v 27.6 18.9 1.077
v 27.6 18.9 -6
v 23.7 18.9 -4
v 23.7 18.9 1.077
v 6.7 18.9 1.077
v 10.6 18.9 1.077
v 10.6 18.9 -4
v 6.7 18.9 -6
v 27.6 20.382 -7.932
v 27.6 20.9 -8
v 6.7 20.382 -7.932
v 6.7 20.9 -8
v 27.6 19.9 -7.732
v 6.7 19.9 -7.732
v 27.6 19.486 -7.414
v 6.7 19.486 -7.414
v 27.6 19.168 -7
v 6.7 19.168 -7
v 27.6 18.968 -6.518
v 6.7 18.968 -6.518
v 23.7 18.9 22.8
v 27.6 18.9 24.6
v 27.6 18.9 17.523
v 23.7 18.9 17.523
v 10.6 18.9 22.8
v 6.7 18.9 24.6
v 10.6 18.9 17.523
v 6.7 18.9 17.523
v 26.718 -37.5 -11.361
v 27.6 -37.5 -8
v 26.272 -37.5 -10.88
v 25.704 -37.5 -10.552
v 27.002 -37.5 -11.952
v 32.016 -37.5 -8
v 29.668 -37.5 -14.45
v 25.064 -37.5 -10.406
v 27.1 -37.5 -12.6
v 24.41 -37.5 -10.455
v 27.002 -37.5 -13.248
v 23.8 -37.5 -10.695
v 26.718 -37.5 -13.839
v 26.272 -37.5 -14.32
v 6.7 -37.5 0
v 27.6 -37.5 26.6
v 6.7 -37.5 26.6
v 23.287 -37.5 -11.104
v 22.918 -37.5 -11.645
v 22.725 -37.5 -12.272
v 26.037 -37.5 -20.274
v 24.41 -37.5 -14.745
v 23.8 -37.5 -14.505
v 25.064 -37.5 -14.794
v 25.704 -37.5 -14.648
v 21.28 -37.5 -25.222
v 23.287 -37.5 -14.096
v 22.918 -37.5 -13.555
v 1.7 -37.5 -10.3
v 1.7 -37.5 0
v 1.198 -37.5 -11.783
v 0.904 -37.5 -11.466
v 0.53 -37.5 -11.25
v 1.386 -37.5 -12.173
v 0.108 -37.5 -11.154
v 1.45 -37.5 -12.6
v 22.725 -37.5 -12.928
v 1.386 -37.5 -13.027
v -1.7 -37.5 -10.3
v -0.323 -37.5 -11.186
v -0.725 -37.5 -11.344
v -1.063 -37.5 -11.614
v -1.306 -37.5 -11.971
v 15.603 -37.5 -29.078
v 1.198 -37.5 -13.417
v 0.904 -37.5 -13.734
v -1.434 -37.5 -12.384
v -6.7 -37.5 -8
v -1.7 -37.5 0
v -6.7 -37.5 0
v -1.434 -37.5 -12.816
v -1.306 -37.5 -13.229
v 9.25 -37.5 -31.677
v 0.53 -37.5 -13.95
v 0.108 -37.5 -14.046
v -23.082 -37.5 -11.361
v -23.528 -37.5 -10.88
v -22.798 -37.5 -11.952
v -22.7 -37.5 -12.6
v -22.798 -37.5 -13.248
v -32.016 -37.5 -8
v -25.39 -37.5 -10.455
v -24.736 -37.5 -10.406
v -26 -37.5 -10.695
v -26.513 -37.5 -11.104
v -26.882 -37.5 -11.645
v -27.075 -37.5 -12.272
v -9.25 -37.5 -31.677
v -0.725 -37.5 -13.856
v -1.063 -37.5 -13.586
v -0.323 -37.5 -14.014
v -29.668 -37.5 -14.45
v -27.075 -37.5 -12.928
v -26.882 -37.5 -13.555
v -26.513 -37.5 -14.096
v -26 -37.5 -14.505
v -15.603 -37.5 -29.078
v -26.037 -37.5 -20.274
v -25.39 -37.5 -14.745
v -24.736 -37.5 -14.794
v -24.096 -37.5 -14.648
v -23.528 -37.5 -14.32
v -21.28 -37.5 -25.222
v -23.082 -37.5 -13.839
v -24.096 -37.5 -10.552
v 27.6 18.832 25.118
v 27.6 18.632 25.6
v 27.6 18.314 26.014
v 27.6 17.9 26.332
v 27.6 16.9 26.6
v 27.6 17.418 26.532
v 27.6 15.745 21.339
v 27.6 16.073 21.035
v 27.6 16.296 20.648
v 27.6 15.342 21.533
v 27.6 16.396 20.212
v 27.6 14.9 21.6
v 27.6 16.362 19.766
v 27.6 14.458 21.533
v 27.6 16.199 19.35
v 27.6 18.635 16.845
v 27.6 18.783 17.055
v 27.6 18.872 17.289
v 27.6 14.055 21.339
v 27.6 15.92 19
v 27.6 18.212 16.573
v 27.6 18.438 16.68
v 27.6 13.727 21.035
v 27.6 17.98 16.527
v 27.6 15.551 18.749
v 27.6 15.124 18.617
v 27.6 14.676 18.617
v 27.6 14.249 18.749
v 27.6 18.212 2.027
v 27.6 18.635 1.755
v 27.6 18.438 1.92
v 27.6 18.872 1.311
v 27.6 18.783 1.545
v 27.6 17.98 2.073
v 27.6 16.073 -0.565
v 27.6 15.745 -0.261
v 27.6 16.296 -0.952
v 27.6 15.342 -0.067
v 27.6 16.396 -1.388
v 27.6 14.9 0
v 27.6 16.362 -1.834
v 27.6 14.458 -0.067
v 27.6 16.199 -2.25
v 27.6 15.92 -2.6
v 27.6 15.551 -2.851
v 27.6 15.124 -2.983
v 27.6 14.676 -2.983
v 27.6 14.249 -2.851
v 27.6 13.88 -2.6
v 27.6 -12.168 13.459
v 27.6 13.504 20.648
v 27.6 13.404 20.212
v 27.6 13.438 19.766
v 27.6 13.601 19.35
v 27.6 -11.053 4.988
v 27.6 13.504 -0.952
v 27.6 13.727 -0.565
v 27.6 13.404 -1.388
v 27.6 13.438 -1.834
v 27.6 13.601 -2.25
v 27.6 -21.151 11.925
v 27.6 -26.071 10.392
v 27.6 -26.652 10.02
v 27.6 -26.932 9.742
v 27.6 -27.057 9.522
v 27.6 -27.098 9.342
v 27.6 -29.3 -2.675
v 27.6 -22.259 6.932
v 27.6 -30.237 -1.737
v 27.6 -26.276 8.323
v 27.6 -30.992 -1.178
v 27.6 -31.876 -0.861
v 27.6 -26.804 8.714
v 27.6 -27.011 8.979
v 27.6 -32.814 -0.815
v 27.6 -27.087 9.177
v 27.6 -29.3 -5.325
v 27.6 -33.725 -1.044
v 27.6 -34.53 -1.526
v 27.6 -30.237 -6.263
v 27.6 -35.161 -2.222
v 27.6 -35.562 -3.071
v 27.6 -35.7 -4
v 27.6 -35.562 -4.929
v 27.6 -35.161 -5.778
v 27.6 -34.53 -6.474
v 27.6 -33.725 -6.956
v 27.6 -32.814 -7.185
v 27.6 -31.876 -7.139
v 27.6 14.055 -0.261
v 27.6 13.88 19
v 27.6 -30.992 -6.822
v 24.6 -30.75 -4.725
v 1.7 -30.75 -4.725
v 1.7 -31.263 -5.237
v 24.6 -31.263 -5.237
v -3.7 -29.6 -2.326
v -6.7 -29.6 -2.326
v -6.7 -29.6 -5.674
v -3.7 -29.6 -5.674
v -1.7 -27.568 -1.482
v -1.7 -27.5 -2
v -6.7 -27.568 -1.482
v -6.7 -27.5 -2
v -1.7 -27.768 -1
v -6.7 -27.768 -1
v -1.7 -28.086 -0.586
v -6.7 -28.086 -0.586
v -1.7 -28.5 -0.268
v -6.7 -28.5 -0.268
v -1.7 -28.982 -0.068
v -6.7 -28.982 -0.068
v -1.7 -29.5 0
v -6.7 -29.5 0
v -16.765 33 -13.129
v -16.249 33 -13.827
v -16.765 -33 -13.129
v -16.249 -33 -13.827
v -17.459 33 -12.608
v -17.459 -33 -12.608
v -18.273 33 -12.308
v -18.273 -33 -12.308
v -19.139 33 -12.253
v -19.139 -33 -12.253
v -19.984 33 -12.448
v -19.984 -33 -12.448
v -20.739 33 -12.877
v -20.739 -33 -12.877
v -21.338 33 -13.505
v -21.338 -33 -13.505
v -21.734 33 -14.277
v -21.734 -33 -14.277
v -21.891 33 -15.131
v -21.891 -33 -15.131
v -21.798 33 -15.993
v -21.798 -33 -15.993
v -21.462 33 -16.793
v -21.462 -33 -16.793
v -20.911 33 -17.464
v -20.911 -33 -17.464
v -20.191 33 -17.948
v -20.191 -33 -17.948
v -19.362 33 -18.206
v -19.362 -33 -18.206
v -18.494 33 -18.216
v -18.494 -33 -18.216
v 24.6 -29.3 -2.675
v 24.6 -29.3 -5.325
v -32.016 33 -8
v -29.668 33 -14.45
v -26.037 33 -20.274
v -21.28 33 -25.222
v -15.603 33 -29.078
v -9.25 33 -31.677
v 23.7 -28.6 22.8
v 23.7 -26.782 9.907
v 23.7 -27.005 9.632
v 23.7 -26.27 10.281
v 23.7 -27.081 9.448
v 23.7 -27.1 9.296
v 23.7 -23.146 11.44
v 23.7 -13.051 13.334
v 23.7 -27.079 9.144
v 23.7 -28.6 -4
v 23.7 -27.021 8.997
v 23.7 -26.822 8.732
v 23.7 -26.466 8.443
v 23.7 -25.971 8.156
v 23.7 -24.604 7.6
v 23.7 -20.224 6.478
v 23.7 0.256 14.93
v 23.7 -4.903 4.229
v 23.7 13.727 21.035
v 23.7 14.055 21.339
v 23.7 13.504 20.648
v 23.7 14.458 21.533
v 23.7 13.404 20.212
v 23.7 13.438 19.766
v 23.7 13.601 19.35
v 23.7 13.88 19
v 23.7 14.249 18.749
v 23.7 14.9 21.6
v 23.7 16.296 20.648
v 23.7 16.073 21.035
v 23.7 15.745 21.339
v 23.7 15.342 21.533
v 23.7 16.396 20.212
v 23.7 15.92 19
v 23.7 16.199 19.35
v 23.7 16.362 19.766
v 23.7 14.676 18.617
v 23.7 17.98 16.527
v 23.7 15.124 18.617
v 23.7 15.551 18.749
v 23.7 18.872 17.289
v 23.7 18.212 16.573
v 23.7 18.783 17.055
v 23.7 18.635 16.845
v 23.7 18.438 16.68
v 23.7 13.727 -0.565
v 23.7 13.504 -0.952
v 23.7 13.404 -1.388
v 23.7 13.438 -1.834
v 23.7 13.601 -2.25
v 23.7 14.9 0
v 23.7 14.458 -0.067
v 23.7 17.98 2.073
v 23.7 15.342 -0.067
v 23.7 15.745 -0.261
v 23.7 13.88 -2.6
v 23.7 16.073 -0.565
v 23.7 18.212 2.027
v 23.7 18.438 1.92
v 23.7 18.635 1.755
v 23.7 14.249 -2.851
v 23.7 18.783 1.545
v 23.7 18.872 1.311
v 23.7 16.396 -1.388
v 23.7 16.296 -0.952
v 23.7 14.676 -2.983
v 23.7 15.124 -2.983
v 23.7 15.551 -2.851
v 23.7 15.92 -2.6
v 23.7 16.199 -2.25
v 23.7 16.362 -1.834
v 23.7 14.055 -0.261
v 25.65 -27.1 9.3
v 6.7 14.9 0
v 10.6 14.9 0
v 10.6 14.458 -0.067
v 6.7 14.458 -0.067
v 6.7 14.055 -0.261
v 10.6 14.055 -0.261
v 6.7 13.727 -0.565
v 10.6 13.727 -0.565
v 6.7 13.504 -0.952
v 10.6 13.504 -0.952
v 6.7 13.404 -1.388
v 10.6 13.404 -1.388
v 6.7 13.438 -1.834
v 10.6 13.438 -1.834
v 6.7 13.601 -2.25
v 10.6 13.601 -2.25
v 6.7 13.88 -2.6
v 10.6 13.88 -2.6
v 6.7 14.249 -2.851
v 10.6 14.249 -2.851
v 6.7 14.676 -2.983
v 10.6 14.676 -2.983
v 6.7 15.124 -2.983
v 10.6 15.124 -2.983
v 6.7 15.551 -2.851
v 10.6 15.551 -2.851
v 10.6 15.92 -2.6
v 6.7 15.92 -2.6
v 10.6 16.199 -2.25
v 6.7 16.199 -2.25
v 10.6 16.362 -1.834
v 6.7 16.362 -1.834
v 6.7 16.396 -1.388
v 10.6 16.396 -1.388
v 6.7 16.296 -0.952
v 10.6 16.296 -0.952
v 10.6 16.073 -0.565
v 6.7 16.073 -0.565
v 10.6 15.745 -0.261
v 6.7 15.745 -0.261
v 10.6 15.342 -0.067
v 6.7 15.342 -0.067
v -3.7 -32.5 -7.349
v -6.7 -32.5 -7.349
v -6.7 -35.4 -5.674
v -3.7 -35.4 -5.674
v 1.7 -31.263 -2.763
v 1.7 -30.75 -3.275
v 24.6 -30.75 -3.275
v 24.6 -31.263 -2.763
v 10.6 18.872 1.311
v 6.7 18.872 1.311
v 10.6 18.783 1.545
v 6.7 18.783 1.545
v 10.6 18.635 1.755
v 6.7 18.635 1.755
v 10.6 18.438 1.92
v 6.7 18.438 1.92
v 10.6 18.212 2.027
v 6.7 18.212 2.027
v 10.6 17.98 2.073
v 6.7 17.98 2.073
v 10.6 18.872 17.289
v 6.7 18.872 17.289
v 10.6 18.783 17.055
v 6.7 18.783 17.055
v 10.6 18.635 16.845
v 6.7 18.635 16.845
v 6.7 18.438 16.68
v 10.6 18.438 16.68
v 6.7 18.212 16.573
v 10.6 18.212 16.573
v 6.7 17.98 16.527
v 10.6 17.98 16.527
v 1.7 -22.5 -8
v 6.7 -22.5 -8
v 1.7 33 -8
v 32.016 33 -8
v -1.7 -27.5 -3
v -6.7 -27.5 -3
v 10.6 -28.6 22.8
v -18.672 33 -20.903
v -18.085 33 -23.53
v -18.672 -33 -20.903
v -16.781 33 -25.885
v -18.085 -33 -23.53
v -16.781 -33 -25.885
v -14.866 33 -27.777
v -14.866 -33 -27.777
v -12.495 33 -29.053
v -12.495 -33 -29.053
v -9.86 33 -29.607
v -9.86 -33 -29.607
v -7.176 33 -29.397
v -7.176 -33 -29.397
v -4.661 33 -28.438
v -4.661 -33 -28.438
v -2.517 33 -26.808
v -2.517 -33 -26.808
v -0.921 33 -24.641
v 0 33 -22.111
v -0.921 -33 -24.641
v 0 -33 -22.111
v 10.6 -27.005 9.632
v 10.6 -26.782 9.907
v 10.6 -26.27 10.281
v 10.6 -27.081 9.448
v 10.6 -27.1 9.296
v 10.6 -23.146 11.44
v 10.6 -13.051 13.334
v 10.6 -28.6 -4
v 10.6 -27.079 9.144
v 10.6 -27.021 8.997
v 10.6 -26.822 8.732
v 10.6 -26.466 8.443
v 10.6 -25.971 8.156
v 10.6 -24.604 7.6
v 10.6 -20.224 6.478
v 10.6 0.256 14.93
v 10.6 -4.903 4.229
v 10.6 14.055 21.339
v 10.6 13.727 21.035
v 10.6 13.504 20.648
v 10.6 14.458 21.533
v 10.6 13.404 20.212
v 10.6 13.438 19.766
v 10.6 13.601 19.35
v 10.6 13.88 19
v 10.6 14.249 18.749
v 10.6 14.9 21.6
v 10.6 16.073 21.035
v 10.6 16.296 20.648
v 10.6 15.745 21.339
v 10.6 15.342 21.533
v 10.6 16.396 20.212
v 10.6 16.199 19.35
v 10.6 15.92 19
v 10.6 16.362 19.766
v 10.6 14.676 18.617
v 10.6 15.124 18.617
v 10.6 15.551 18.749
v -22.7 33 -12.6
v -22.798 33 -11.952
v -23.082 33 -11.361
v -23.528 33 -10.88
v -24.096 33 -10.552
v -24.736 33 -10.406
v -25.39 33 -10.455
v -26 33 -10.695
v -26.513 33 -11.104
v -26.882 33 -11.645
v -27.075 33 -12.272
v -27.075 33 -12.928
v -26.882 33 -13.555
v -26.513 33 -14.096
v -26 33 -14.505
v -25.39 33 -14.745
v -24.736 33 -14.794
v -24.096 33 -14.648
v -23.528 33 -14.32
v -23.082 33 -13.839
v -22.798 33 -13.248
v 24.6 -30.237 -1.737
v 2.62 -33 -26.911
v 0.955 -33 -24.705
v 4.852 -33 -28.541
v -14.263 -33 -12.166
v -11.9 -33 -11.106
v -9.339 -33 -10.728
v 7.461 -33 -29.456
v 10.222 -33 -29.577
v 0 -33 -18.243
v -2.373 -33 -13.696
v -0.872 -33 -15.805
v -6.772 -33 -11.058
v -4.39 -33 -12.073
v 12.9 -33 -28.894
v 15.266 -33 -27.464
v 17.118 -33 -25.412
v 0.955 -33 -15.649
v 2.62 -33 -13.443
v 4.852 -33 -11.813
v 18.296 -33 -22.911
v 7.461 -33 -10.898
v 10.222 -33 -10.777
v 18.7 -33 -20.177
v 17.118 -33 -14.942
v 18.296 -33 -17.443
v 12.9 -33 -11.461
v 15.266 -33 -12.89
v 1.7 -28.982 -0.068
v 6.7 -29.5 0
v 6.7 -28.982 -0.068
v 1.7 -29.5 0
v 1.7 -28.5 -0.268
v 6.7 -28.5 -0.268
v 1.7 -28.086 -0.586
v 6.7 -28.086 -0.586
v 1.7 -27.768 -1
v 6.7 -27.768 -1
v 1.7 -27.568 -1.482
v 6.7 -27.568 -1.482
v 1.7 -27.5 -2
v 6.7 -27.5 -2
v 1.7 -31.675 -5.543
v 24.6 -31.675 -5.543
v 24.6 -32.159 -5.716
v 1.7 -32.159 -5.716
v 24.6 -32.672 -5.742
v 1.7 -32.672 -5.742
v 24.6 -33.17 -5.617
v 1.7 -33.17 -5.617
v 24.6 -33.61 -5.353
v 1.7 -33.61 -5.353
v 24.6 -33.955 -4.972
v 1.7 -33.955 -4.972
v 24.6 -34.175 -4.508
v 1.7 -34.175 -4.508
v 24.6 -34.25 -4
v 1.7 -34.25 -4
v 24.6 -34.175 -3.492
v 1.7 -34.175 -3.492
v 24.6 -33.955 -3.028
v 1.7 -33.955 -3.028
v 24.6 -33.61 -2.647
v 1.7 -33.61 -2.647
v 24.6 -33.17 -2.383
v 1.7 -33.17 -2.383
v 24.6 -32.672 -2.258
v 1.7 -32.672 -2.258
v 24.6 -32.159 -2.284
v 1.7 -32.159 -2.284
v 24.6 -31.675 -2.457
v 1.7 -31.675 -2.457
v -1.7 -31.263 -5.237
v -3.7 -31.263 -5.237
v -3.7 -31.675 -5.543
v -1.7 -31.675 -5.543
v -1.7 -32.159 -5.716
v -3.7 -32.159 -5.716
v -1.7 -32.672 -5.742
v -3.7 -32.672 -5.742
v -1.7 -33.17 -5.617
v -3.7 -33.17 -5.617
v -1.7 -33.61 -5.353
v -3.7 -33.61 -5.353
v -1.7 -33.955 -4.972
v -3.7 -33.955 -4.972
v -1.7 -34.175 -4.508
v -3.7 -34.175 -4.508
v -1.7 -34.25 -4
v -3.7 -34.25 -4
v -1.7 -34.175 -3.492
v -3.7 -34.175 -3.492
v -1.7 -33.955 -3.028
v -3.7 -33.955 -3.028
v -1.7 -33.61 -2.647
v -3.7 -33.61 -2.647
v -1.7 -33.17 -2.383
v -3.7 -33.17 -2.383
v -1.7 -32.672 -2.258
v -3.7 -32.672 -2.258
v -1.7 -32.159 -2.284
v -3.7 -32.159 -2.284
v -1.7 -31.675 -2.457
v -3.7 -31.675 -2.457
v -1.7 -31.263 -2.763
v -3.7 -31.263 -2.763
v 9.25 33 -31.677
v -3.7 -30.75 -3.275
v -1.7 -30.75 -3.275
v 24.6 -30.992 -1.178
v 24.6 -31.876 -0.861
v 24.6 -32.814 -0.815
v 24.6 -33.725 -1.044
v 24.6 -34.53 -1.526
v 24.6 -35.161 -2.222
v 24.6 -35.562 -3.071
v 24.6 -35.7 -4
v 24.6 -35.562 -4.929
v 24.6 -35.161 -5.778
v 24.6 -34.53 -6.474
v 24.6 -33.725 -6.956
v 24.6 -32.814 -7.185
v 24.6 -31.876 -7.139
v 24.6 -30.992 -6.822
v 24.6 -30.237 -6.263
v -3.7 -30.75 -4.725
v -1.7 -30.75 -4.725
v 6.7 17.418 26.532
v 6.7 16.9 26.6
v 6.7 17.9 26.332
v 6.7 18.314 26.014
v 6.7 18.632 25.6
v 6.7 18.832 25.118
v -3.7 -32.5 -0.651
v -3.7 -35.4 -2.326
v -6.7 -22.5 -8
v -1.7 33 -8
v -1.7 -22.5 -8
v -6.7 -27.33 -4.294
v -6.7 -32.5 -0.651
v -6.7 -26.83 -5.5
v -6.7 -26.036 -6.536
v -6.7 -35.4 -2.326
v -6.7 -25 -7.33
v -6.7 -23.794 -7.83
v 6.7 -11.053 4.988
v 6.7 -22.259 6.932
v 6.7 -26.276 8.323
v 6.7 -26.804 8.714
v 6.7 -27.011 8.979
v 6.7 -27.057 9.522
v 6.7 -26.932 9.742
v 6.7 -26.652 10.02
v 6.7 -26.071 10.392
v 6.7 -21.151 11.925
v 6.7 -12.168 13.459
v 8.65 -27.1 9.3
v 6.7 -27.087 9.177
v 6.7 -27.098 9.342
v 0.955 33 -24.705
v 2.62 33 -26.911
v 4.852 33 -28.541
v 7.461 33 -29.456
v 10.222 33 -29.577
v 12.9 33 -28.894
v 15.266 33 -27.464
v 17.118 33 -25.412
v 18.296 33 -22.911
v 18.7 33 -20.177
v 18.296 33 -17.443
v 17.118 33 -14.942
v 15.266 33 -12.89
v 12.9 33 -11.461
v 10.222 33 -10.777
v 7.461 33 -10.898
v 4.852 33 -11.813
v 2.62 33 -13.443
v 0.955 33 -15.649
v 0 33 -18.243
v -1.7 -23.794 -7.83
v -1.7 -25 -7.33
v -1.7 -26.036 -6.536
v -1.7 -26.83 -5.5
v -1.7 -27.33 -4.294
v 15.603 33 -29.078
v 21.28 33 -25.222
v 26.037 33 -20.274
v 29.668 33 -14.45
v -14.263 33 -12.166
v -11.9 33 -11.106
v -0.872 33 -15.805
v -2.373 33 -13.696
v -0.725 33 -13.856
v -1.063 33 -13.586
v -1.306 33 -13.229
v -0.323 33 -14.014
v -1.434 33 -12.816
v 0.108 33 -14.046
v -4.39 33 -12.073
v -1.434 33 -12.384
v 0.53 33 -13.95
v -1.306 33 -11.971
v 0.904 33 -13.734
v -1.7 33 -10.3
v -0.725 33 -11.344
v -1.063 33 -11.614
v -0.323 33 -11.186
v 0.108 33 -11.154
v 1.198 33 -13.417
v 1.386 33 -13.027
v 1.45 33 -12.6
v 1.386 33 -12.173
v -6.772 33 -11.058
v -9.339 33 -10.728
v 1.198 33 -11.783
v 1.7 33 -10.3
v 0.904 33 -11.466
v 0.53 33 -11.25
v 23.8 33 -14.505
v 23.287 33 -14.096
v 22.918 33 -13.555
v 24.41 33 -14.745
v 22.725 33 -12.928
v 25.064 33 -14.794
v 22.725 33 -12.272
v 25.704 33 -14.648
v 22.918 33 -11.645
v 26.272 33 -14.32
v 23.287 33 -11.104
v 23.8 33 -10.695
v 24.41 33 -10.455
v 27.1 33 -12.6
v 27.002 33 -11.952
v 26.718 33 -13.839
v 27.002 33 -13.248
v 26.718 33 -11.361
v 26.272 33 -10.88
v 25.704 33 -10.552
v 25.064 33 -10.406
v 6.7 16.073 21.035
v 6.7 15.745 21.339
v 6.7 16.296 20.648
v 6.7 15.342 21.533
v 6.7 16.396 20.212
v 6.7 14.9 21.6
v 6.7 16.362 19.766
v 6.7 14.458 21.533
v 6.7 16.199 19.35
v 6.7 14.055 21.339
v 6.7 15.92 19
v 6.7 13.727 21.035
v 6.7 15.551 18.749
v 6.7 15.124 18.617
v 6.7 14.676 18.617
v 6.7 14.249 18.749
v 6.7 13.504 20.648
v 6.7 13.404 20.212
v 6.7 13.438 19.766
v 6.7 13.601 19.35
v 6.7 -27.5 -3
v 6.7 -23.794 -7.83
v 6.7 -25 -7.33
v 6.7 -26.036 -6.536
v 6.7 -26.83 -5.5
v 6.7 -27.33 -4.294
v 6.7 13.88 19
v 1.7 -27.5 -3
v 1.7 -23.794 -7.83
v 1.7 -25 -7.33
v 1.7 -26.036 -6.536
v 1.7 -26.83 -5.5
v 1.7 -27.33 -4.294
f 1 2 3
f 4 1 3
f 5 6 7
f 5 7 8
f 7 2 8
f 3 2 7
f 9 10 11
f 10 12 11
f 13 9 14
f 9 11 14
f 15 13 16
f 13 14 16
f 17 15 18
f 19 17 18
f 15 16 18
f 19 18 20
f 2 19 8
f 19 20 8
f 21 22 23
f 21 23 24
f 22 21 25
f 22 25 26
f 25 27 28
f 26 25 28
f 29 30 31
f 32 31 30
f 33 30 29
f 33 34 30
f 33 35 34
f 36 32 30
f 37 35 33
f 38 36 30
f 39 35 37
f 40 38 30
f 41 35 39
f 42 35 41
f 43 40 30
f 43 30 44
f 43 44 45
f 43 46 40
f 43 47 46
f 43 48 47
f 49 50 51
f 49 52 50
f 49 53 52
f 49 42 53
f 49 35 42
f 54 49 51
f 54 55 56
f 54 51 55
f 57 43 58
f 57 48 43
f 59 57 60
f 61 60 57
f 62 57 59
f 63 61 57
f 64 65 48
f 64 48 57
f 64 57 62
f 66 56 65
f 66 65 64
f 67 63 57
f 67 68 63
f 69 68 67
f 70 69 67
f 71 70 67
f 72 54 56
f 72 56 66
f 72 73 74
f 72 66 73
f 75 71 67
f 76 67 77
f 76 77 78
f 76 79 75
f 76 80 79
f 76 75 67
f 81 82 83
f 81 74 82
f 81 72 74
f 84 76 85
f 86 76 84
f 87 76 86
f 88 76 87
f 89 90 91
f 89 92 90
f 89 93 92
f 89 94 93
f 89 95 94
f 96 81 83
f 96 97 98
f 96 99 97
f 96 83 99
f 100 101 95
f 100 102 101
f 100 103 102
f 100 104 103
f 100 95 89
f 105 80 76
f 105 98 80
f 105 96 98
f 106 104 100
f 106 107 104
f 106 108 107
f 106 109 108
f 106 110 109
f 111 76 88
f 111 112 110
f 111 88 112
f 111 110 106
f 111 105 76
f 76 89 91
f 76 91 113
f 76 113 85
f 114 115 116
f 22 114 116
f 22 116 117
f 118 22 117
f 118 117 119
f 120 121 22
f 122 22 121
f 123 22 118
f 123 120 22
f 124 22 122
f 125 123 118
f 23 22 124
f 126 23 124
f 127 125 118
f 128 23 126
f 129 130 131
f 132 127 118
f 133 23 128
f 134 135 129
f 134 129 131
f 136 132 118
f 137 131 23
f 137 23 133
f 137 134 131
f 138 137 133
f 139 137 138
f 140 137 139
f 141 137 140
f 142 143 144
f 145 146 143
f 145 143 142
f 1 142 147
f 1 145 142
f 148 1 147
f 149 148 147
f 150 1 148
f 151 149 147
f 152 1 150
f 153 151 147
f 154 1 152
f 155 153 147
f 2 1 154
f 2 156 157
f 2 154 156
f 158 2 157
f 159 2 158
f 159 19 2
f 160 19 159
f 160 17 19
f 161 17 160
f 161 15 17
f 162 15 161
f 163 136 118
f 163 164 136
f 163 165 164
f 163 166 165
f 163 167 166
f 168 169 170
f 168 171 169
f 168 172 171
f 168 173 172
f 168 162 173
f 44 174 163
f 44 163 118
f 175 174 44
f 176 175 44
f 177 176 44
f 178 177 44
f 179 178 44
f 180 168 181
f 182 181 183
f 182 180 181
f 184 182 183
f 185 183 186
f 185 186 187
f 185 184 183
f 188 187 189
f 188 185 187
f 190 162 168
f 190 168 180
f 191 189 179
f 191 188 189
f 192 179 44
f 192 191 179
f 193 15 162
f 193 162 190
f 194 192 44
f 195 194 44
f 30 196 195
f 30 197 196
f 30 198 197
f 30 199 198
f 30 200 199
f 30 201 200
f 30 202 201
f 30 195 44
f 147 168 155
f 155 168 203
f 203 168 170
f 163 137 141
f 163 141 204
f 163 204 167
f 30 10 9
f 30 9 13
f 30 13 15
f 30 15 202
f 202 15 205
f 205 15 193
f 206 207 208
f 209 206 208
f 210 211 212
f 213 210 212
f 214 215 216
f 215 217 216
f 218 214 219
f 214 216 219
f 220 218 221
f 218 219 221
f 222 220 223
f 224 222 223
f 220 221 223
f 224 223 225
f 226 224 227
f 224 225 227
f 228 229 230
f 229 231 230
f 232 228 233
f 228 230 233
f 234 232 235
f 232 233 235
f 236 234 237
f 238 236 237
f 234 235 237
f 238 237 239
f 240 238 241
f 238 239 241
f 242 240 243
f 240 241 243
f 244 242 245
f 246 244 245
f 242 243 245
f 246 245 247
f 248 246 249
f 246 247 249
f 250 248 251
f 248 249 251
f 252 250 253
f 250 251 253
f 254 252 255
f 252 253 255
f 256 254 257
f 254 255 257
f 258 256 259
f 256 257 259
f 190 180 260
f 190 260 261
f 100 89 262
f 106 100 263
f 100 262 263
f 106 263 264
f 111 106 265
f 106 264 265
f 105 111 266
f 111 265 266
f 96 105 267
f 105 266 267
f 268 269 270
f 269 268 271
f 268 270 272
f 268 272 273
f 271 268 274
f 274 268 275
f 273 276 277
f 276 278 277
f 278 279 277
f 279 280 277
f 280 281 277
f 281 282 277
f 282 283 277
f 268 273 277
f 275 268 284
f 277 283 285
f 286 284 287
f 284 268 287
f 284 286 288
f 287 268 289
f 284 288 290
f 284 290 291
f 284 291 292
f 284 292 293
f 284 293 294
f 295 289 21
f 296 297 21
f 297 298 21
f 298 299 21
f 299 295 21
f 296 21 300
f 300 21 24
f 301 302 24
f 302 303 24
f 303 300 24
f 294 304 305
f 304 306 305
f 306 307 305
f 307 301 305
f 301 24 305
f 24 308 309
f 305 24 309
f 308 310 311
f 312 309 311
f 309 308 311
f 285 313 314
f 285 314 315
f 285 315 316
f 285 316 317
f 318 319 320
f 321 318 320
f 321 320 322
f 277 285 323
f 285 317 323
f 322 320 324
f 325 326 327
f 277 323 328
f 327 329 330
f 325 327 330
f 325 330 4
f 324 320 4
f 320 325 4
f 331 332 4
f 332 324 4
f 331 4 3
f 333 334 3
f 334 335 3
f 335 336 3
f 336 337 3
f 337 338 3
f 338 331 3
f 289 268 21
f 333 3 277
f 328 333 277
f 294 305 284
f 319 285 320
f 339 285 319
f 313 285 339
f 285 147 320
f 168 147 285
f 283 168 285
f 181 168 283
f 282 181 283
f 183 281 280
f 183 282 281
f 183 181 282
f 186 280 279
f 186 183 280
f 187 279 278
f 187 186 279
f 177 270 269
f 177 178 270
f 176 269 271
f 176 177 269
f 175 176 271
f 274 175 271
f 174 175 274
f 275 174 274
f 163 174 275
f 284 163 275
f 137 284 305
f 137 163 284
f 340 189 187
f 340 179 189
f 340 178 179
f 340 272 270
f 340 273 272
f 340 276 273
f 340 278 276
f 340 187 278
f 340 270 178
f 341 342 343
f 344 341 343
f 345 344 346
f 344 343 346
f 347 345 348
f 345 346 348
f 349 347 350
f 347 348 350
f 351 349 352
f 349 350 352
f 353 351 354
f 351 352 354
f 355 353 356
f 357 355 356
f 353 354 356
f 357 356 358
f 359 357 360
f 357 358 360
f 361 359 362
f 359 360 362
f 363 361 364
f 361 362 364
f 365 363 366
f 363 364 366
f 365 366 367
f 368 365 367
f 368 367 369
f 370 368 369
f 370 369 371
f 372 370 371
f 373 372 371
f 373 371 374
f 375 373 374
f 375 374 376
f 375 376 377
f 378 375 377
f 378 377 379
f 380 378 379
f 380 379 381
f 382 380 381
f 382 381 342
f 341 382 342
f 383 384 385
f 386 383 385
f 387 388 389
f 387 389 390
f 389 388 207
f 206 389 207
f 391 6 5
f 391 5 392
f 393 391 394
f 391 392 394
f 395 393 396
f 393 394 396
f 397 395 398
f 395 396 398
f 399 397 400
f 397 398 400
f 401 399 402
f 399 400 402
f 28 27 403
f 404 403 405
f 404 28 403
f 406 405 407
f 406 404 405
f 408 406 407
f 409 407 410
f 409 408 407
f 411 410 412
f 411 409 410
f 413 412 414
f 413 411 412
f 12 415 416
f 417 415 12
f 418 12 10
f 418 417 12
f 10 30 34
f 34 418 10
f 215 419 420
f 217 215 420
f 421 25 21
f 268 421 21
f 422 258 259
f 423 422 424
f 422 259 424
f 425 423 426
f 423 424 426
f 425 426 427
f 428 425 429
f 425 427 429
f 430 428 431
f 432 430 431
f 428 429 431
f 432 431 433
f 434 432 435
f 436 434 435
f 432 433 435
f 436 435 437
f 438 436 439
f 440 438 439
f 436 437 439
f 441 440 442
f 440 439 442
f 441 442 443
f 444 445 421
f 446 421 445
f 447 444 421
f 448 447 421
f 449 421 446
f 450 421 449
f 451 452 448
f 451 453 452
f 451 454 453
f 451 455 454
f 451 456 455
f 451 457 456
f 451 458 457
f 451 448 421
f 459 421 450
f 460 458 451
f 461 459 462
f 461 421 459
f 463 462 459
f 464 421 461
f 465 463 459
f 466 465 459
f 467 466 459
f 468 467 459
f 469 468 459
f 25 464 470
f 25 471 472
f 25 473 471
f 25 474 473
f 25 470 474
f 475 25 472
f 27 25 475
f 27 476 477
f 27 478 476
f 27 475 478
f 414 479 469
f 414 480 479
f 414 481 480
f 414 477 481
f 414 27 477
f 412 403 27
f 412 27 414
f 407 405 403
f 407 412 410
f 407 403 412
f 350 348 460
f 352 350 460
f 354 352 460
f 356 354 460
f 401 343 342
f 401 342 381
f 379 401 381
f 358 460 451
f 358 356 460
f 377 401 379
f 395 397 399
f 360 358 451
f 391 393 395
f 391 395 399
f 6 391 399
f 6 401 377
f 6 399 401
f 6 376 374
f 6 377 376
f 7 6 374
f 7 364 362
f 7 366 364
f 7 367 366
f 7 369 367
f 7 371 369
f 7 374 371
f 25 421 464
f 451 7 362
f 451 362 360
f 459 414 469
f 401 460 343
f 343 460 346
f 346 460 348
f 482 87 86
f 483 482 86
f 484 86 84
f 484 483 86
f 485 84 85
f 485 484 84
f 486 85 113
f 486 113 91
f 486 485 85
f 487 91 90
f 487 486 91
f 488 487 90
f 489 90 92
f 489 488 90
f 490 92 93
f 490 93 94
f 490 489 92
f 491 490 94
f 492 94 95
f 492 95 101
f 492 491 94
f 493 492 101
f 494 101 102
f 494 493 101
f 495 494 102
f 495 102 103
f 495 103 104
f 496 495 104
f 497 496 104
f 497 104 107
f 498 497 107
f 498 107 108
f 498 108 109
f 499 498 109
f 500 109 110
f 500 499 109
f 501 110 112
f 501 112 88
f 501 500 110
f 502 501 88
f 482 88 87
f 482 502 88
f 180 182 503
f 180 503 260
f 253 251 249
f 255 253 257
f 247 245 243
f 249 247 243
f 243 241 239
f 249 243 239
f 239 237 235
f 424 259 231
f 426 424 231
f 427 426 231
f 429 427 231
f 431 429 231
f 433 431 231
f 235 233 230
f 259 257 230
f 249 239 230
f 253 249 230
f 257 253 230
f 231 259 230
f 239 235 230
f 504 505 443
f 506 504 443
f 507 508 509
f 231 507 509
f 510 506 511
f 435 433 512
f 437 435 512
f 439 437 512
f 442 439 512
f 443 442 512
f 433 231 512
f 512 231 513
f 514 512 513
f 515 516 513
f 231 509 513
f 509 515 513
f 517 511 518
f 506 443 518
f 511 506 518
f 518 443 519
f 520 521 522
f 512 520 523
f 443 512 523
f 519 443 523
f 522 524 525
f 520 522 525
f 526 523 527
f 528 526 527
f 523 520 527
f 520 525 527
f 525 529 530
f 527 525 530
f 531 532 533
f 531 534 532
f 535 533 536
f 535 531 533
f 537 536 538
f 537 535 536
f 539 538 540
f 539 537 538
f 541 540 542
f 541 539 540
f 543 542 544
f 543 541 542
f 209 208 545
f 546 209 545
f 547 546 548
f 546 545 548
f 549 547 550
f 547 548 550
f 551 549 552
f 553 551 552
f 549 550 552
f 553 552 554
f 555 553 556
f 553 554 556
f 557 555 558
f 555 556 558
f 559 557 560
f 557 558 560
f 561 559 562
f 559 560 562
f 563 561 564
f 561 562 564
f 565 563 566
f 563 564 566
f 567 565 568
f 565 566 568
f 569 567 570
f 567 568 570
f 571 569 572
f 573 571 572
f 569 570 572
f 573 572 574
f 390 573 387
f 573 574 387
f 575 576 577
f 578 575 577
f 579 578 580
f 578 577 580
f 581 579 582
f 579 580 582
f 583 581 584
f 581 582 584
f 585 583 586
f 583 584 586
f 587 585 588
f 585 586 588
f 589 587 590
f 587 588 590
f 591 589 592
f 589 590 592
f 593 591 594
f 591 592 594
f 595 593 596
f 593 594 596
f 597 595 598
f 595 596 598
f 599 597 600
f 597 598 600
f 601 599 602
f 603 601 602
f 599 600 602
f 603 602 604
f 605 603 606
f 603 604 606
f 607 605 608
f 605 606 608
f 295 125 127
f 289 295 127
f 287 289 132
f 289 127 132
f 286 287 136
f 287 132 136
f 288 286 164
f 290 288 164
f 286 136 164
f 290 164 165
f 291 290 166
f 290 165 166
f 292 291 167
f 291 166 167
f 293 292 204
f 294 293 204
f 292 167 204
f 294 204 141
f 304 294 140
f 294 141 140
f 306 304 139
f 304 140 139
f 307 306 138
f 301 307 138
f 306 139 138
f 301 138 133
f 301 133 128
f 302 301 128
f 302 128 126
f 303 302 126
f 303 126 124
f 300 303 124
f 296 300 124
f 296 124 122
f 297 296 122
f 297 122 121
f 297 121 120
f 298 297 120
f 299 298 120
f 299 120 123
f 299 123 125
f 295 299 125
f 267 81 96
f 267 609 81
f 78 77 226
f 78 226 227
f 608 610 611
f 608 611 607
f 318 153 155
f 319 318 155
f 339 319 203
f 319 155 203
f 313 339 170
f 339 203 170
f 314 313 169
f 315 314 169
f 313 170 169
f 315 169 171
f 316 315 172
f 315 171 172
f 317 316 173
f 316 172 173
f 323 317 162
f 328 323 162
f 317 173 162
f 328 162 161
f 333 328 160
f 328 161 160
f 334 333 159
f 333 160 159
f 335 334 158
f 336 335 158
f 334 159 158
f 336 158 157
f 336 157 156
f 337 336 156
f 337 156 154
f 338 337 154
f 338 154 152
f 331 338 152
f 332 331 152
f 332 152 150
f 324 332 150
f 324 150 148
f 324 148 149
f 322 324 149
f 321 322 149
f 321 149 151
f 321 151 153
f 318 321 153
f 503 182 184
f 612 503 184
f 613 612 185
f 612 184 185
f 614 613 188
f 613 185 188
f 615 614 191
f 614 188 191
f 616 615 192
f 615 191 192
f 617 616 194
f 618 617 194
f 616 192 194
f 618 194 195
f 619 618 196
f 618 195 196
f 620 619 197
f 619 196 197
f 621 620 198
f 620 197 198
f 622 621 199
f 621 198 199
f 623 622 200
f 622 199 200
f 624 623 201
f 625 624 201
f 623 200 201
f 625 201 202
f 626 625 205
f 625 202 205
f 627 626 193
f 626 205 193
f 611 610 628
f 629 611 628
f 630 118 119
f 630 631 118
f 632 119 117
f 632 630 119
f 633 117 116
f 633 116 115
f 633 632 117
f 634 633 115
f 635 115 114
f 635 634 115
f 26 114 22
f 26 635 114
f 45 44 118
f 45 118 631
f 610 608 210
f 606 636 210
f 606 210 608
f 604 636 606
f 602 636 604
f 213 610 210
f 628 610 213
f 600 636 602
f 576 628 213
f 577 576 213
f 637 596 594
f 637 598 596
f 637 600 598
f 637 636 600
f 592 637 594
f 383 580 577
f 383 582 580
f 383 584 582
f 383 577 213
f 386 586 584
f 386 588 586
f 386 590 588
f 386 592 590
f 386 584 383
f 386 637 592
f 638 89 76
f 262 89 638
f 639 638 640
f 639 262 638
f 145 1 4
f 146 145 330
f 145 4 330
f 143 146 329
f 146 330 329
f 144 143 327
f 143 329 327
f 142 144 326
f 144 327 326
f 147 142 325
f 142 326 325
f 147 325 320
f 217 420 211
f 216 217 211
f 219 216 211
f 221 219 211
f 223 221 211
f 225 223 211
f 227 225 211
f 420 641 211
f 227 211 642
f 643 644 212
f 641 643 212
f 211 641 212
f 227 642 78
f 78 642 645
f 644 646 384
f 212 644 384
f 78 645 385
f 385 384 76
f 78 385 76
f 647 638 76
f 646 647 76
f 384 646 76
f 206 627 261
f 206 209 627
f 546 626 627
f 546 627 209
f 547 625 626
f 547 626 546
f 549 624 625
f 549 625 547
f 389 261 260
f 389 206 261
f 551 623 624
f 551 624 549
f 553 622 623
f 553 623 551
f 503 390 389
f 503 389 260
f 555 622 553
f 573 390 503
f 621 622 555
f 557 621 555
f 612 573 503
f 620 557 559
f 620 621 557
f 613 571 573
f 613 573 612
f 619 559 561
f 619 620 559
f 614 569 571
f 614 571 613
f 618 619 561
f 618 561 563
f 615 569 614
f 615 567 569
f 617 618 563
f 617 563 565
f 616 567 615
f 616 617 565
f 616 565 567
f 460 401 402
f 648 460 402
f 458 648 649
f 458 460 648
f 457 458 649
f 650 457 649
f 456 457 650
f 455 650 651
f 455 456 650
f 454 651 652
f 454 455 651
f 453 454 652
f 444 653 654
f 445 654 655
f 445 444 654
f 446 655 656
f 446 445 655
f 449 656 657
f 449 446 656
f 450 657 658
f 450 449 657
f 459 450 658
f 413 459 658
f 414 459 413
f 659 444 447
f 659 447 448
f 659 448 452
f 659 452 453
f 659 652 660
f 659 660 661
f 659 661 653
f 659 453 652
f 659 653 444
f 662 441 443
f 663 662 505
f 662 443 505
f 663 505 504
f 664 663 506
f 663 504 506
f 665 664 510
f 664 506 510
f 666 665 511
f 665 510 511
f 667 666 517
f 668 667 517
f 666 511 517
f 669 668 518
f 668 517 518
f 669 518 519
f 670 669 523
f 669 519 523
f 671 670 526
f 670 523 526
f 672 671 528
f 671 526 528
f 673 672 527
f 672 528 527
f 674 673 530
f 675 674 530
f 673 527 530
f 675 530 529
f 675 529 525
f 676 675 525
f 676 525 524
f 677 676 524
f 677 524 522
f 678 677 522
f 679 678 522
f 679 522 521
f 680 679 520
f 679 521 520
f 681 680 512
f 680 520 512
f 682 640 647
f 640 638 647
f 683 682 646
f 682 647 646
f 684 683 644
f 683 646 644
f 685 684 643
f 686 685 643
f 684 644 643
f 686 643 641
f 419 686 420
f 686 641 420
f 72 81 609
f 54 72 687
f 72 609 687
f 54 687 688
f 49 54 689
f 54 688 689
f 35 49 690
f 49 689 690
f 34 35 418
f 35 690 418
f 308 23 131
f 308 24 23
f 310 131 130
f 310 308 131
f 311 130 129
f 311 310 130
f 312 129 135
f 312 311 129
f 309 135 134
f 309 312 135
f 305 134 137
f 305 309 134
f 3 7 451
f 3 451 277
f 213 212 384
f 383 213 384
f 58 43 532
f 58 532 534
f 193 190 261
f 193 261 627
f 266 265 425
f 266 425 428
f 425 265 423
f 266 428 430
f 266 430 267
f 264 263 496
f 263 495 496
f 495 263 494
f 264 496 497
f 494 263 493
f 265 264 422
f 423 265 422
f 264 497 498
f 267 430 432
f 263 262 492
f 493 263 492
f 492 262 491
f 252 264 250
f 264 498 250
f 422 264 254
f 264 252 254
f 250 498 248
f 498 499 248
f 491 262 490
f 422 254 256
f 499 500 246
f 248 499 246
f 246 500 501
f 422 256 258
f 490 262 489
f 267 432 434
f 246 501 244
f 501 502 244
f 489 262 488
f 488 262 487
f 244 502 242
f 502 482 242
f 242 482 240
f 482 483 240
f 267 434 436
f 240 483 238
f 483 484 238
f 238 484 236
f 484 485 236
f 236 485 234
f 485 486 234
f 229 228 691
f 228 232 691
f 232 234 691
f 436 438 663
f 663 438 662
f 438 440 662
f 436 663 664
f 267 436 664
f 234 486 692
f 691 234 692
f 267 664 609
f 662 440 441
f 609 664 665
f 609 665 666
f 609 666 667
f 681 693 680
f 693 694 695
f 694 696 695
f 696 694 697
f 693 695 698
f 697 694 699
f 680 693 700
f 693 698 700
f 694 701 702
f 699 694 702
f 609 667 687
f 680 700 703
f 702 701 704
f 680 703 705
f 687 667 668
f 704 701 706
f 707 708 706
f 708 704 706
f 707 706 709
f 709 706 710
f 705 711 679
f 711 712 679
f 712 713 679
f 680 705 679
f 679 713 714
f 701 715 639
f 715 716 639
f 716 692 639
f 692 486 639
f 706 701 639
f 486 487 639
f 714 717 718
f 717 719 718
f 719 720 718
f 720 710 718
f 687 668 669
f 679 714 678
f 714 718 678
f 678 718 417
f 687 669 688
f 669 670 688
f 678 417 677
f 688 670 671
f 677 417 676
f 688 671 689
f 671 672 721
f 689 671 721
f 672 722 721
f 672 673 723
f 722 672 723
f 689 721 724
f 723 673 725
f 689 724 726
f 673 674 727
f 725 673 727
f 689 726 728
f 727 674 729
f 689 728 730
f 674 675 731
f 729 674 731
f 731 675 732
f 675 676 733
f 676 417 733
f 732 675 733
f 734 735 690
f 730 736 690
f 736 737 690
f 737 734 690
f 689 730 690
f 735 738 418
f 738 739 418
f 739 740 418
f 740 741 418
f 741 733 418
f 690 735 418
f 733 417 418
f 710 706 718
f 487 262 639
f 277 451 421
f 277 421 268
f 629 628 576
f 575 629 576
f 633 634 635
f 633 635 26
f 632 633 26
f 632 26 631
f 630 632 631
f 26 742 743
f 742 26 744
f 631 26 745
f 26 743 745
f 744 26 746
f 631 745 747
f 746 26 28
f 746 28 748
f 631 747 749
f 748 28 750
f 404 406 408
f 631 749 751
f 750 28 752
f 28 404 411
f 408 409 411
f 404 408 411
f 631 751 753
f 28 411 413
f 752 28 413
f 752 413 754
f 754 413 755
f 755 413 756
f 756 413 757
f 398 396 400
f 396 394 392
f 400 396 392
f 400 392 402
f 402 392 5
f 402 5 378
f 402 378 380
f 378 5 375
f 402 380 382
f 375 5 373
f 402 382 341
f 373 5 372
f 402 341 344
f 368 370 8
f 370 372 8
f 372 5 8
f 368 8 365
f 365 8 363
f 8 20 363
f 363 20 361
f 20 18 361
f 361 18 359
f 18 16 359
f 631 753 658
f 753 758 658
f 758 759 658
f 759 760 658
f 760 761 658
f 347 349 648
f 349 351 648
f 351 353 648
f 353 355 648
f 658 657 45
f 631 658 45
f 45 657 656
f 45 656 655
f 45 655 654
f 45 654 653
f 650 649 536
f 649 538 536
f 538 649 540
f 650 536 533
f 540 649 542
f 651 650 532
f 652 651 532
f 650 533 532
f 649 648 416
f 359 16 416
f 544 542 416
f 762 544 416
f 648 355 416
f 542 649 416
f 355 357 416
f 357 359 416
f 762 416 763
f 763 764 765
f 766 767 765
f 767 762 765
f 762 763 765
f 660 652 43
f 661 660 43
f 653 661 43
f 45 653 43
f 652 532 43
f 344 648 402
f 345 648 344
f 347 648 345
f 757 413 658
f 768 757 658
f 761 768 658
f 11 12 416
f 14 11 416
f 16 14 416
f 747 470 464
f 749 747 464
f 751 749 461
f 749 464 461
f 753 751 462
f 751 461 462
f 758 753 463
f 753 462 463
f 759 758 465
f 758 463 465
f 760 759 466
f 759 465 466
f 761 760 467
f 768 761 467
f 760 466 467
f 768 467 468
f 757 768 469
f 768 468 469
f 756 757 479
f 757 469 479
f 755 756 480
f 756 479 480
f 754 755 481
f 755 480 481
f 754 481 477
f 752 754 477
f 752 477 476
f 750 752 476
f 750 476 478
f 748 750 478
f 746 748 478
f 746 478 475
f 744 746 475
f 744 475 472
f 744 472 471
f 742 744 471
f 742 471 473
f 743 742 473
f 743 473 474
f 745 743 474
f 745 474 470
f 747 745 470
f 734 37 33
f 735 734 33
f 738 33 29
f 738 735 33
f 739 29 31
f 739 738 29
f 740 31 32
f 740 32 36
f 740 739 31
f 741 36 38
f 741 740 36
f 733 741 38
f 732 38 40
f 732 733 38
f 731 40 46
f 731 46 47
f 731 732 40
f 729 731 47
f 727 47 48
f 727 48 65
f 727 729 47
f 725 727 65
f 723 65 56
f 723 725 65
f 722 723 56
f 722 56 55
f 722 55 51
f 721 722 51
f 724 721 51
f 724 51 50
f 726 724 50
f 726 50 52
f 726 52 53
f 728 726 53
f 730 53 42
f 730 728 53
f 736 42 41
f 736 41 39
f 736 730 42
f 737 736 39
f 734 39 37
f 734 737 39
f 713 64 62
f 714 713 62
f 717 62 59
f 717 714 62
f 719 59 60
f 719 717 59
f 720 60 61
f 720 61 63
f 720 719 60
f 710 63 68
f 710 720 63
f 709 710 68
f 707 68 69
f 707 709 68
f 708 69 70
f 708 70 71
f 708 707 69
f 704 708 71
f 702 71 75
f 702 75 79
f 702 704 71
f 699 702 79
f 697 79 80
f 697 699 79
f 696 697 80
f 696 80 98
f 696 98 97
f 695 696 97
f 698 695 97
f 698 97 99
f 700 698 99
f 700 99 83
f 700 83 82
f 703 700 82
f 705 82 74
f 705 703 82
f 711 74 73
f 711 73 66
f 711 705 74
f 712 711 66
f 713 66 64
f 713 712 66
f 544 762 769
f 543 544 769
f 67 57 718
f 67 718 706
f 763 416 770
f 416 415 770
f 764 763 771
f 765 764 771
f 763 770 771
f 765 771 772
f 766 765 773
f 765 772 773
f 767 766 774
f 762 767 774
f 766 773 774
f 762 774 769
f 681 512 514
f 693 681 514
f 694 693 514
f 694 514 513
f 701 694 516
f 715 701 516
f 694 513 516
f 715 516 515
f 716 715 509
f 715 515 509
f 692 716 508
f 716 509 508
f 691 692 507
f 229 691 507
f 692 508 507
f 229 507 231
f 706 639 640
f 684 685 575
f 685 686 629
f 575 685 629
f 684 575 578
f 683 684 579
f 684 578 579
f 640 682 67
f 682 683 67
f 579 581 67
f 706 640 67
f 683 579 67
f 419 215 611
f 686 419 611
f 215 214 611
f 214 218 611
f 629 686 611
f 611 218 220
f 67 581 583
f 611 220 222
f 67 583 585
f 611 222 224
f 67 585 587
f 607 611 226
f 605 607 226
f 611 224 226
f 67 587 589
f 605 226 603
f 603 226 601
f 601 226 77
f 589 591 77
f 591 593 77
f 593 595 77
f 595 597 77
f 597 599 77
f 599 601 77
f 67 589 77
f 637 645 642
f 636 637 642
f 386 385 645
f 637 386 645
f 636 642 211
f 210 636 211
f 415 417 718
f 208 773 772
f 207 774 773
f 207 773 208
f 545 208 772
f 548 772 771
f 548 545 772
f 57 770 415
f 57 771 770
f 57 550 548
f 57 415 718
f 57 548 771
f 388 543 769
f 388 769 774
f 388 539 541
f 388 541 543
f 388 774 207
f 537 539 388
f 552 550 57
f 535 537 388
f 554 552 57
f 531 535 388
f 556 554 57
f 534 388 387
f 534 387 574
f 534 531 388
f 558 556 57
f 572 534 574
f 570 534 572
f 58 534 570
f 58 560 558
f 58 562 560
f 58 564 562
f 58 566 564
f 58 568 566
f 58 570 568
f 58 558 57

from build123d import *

# Parameters (mm, degrees)
SKETCH_R        = 2.2
SKETCH_R_2      = 1.45
PAD_DEPTH       = 33
SKETCH037_R     = 2.2
SKETCH037_R_2   = 1.45
PAD016_DEPTH    = 4.5
SKETCH039_W     = 13.4
SKETCH039_H     = 10
PAD017_DEPTH    = 8
SKETCH045_W     = 20.9
SKETCH045_H     = 56.4
PAD018_DEPTH    = 34.6
POCKET022_DEPTH = 38.716621
SKETCH046_W     = 13.1
SKETCH046_H     = 26.8
POCKET023_DEPTH = 47.5
SKETCH047_R     = 1.5
POCKET024_DEPTH = 20.9
SKETCH041_W     = 3.4
SKETCH041_H     = 77.902924
POCKET025_DEPTH = 10.3
POCKET027_DEPTH = 3
FILLET014_R     = 5
FILLET015_R     = 2
FILLET016_R     = 2
FILLET017_R     = 1
POCKET028_DEPTH = 3


with BuildPart() as part:
    # Sketch → Pad (new body, symmetric)
    with BuildSketch(Plane.XZ):
        with BuildLine():
            Line((-9.25, -31.677082), (9.25, -31.677082))
            ThreePointArc((9.25, -31.677082), (23.787894, -22.872168), (32.015621, -8))
            Line((-32.015621, -8), (32.015621, -8))
            ThreePointArc((-32.015621, -8), (-23.787894, -22.872168), (-9.25, -31.677082))
        make_face()
        with Locations((24.9, -12.6)):
            Circle(SKETCH_R, mode=Mode.SUBTRACT)
        with Locations((-24.9, -12.6)):
            Circle(SKETCH_R, mode=Mode.SUBTRACT)
        with Locations((0, -12.6)):
            Circle(SKETCH_R_2, mode=Mode.SUBTRACT)
        with BuildLine():
            ThreePointArc((0, -18.243174), (-6.771568, -11.057878), (-16.248592, -13.827105))
            ThreePointArc((-16.248592, -13.827105), (-21.564175, -13.876493), (-18.494342, -18.216307))
            ThreePointArc((-18.494342, -18.216307), (-11.197344, -29.424262), (0, -22.11099))
            ThreePointArc((0, -22.11099), (18.7, -20.177082), (0, -18.243174))
        make_face(mode=Mode.SUBTRACT)
    extrude(amount=PAD_DEPTH, both=True)

    # Sketch037 → Pad016 (join)
    with BuildSketch(Plane.XZ.offset(33)):
        with BuildLine():
            ThreePointArc((-32.015621, -8), (-23.787894, -22.872168), (-9.25, -31.677082))
            Line((9.25, -31.677082), (-9.25, -31.677082))
            ThreePointArc((9.25, -31.677082), (23.787894, -22.872168), (32.015621, -8))
            Line((-32.015621, -8), (32.015621, -8))
        make_face()
        with Locations((-24.9, -12.6)):
            Circle(SKETCH037_R, mode=Mode.SUBTRACT)
        with Locations((0, -12.6)):
            Circle(SKETCH037_R_2, mode=Mode.SUBTRACT)
        with Locations((24.9, -12.6)):
            Circle(SKETCH037_R, mode=Mode.SUBTRACT)
    extrude(amount=PAD016_DEPTH)

    # Sketch039 (on Face2 of Pad016) → Pad017 (join)
    with BuildSketch(Plane(origin=(0, 0, -8), x_dir=(-1, 0, 0), z_dir=(0, 0, 1))):
        with Locations((0, 32.5)):
            Rectangle(SKETCH039_W, SKETCH039_H)
    extrude(amount=PAD017_DEPTH)

    # Sketch045 (on Face2 of Pad017) → Pad018 (join)
    with BuildSketch(Plane(origin=(0, 0, -8), x_dir=(-1, 0, 0), z_dir=(0, 0, 1))):
        with Locations((-17.15, 9.3)):
            Rectangle(SKETCH045_W, SKETCH045_H)
    extrude(amount=PAD018_DEPTH)

    # Sketch040 (on Face12 of Pad018) → Pocket022 (cut, through all)
    with BuildSketch(Plane(origin=(-6.7, 0, -11), x_dir=(0, 0, -1), z_dir=(-1, 0, 0))):
        with BuildLine():
            Line((-7.724863, 30.75), (-6.275126, 30.75))
            Line((-6.275126, 30.75), (-5.762563, 31.262563))
            ThreePointArc((-5.762563, 31.262563), (-7, 34.25), (-8.237437, 31.262563))
            Line((-7.724863, 30.75), (-8.237437, 31.262563))
        make_face()
    extrude(amount=-POCKET022_DEPTH, mode=Mode.SUBTRACT)

    # Sketch046 (on Face9 of Pocket022) → Pocket023 (cut)
    with BuildSketch(Plane(origin=(0, 18.9, 0), x_dir=(1, 0, 0), z_dir=(0, 1, 0))):
        with Locations((17.15, -9.4)):
            Rectangle(SKETCH046_W, SKETCH046_H)
    extrude(amount=-POCKET023_DEPTH, mode=Mode.SUBTRACT)

    # Sketch047 (on Face8 of Pocket023) → Pocket024 (cut)
    with BuildSketch(Plane(origin=(27.6, 0, 0), x_dir=(0, 0, 1), z_dir=(1, 0, 0))):
        with BuildLine():
            add(Edge.make_bspline(
                [(2, -18.9), (9.3, 73.1), (16.6, -18.9)],
                knots=[-7.3, -7.3, -7.3, 7.3, 7.3, 7.3], degree=2))
            Line((16.6, -18.9), (2, -18.9))
        make_face()
        with Locations((-1.5, -14.9)):
            Circle(SKETCH047_R)
        with Locations((20.1, -14.9)):
            Circle(SKETCH047_R)
    extrude(amount=-POCKET024_DEPTH, mode=Mode.SUBTRACT)

    # Sketch041 (on Face38 of Pocket024) → Pocket025 (cut)
    with BuildSketch(Plane(origin=(0, 0, 0), x_dir=(-1, 0, 0), z_dir=(0, 0, 1))):
        with Locations((0, -1.451462)):
            Rectangle(SKETCH041_W, SKETCH041_H)
    extrude(amount=-POCKET025_DEPTH, mode=Mode.SUBTRACT)

    # Sketch051 (on Face8 of Pocket025) → Pocket027 (cut)
    with BuildSketch(Plane(origin=(-6.7, 0, 0), x_dir=(0, 0, -1), z_dir=(-1, 0, 0))):
        Polygon((5.674316, 29.6), (7.348632, 32.5), (5.674316, 35.4), (2.325684, 35.4), (0.651368, 32.5), (2.325684, 29.6), align=None)
    extrude(amount=-POCKET027_DEPTH, mode=Mode.SUBTRACT)

    # Fillet014
    fillet014_edges = [part.edges().sort_by_distance(p)[0] for p in [
        (-4.2, -27.5, -8),
        (4.2, -27.5, -8),
    ]]
    fillet(fillet014_edges, radius=FILLET014_R)

    # Fillet015
    fillet015_edges = [part.edges().sort_by_distance(p)[0] for p in [
        (-4.2, -27.5, 0),
        (4.2, -27.5, 0),
    ]]
    fillet(fillet015_edges, radius=FILLET015_R)

    # Fillet016
    fillet016_edges = [part.edges().sort_by_distance(p)[0] for p in [
        (17.15, 18.9, -8),
        (17.15, 18.9, 26.6),
    ]]
    fillet(fillet016_edges, radius=FILLET016_R)

    # Fillet017
    fillet017_edges = [part.edges().sort_by_distance(p)[0] for p in [
        (25.65, 18.9, 2),
        (8.65, 18.9, 2),
        (8.65, 18.9, 16.6),
        (25.65, 18.9, 16.6),
    ]]
    fillet(fillet017_edges, radius=FILLET017_R)

    # Sketch052 (on Face18 of Fillet017) → Pocket028 (cut)
    with BuildSketch(Plane(origin=(27.6, 0, 0), x_dir=(0, 0, 1), z_dir=(1, 0, 0))):
        with BuildLine():
            ThreePointArc((-1.737258, 30.237259), (-3.999993, 35.7), (-6.262753, 30.237269))
            Line((-5.325483, 29.3), (-6.262753, 30.237269))
            Line((-2.674516, 29.3), (-5.325483, 29.3))
            Line((-1.737258, 30.237259), (-2.674516, 29.3))
        make_face()
    extrude(amount=-POCKET028_DEPTH, mode=Mode.SUBTRACT)


solid = part.part
